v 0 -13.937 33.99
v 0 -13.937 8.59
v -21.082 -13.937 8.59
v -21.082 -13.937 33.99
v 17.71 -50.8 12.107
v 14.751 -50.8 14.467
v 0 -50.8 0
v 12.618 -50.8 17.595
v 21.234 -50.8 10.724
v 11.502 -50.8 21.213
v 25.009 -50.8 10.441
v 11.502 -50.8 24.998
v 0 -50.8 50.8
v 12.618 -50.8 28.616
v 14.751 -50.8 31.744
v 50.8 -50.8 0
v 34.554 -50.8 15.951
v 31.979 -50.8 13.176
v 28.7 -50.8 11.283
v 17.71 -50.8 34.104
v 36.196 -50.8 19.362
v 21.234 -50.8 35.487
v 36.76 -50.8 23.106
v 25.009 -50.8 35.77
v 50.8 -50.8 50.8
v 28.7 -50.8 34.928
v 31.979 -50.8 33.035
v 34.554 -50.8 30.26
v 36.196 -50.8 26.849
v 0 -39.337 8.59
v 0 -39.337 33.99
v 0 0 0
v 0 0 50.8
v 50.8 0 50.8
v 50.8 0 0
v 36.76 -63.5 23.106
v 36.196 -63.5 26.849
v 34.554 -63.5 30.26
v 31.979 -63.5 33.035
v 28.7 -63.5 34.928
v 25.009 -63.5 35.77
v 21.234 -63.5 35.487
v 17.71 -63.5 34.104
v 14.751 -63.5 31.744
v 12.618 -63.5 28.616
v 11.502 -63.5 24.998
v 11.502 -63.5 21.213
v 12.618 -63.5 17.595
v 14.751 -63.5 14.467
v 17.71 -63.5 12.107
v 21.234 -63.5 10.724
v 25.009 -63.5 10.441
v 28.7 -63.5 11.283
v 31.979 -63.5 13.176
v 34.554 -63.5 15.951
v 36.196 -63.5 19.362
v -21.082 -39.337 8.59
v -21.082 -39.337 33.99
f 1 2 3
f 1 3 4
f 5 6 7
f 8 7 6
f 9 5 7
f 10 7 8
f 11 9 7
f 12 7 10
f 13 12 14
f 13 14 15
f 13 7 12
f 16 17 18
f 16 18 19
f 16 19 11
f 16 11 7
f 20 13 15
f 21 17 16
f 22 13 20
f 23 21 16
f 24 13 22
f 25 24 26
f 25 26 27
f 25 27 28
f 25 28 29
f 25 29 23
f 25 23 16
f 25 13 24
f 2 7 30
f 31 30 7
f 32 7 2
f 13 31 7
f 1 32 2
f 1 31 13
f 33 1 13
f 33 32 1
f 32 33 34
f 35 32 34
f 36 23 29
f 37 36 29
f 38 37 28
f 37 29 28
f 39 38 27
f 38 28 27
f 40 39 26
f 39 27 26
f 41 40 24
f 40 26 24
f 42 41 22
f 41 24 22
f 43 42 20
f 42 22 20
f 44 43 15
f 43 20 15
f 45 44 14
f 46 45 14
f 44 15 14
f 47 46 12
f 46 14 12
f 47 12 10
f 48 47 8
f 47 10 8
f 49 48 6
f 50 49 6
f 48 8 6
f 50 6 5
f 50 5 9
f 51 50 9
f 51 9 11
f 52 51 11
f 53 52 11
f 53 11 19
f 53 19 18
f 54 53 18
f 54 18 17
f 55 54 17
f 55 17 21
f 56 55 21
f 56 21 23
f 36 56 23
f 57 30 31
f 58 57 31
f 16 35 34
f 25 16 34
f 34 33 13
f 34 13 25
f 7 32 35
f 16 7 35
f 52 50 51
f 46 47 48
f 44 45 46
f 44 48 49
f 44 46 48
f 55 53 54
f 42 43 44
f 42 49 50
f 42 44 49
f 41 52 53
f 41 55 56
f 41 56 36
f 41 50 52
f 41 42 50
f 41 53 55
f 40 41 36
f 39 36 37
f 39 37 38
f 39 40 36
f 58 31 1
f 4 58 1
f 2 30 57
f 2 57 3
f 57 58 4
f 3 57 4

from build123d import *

# Parameters (mm, degrees)
F0_W     = 50.8
F0_H     = 50.8
F1_DEPTH = 50.8
F2_R     = 12.7
F3_DEPTH = 63.5
F4_W     = 25.4
F4_H     = 25.4
F5_DEPTH = 21.082


with BuildPart() as f1:
    # F0 (on Front) → F1 (new body)
    with BuildSketch(Plane.XZ):
        with Locations((25.4, 25.4)):
            Rectangle(F0_W, F0_H)
    extrude(amount=F1_DEPTH)

    # F2 (on Front) → F3 (join)
    with BuildSketch(Plane.XZ):
        with Locations((24.060287, 23.105513)):
            Circle(F2_R)
    extrude(amount=F3_DEPTH)

    # F4 (on Right) → F5 (join)
    with BuildSketch(Plane.YZ):
        with Locations((-26.636659, 21.289929)):
            Rectangle(F4_W, F4_H)
    extrude(amount=-F5_DEPTH)


solid = f1.part
